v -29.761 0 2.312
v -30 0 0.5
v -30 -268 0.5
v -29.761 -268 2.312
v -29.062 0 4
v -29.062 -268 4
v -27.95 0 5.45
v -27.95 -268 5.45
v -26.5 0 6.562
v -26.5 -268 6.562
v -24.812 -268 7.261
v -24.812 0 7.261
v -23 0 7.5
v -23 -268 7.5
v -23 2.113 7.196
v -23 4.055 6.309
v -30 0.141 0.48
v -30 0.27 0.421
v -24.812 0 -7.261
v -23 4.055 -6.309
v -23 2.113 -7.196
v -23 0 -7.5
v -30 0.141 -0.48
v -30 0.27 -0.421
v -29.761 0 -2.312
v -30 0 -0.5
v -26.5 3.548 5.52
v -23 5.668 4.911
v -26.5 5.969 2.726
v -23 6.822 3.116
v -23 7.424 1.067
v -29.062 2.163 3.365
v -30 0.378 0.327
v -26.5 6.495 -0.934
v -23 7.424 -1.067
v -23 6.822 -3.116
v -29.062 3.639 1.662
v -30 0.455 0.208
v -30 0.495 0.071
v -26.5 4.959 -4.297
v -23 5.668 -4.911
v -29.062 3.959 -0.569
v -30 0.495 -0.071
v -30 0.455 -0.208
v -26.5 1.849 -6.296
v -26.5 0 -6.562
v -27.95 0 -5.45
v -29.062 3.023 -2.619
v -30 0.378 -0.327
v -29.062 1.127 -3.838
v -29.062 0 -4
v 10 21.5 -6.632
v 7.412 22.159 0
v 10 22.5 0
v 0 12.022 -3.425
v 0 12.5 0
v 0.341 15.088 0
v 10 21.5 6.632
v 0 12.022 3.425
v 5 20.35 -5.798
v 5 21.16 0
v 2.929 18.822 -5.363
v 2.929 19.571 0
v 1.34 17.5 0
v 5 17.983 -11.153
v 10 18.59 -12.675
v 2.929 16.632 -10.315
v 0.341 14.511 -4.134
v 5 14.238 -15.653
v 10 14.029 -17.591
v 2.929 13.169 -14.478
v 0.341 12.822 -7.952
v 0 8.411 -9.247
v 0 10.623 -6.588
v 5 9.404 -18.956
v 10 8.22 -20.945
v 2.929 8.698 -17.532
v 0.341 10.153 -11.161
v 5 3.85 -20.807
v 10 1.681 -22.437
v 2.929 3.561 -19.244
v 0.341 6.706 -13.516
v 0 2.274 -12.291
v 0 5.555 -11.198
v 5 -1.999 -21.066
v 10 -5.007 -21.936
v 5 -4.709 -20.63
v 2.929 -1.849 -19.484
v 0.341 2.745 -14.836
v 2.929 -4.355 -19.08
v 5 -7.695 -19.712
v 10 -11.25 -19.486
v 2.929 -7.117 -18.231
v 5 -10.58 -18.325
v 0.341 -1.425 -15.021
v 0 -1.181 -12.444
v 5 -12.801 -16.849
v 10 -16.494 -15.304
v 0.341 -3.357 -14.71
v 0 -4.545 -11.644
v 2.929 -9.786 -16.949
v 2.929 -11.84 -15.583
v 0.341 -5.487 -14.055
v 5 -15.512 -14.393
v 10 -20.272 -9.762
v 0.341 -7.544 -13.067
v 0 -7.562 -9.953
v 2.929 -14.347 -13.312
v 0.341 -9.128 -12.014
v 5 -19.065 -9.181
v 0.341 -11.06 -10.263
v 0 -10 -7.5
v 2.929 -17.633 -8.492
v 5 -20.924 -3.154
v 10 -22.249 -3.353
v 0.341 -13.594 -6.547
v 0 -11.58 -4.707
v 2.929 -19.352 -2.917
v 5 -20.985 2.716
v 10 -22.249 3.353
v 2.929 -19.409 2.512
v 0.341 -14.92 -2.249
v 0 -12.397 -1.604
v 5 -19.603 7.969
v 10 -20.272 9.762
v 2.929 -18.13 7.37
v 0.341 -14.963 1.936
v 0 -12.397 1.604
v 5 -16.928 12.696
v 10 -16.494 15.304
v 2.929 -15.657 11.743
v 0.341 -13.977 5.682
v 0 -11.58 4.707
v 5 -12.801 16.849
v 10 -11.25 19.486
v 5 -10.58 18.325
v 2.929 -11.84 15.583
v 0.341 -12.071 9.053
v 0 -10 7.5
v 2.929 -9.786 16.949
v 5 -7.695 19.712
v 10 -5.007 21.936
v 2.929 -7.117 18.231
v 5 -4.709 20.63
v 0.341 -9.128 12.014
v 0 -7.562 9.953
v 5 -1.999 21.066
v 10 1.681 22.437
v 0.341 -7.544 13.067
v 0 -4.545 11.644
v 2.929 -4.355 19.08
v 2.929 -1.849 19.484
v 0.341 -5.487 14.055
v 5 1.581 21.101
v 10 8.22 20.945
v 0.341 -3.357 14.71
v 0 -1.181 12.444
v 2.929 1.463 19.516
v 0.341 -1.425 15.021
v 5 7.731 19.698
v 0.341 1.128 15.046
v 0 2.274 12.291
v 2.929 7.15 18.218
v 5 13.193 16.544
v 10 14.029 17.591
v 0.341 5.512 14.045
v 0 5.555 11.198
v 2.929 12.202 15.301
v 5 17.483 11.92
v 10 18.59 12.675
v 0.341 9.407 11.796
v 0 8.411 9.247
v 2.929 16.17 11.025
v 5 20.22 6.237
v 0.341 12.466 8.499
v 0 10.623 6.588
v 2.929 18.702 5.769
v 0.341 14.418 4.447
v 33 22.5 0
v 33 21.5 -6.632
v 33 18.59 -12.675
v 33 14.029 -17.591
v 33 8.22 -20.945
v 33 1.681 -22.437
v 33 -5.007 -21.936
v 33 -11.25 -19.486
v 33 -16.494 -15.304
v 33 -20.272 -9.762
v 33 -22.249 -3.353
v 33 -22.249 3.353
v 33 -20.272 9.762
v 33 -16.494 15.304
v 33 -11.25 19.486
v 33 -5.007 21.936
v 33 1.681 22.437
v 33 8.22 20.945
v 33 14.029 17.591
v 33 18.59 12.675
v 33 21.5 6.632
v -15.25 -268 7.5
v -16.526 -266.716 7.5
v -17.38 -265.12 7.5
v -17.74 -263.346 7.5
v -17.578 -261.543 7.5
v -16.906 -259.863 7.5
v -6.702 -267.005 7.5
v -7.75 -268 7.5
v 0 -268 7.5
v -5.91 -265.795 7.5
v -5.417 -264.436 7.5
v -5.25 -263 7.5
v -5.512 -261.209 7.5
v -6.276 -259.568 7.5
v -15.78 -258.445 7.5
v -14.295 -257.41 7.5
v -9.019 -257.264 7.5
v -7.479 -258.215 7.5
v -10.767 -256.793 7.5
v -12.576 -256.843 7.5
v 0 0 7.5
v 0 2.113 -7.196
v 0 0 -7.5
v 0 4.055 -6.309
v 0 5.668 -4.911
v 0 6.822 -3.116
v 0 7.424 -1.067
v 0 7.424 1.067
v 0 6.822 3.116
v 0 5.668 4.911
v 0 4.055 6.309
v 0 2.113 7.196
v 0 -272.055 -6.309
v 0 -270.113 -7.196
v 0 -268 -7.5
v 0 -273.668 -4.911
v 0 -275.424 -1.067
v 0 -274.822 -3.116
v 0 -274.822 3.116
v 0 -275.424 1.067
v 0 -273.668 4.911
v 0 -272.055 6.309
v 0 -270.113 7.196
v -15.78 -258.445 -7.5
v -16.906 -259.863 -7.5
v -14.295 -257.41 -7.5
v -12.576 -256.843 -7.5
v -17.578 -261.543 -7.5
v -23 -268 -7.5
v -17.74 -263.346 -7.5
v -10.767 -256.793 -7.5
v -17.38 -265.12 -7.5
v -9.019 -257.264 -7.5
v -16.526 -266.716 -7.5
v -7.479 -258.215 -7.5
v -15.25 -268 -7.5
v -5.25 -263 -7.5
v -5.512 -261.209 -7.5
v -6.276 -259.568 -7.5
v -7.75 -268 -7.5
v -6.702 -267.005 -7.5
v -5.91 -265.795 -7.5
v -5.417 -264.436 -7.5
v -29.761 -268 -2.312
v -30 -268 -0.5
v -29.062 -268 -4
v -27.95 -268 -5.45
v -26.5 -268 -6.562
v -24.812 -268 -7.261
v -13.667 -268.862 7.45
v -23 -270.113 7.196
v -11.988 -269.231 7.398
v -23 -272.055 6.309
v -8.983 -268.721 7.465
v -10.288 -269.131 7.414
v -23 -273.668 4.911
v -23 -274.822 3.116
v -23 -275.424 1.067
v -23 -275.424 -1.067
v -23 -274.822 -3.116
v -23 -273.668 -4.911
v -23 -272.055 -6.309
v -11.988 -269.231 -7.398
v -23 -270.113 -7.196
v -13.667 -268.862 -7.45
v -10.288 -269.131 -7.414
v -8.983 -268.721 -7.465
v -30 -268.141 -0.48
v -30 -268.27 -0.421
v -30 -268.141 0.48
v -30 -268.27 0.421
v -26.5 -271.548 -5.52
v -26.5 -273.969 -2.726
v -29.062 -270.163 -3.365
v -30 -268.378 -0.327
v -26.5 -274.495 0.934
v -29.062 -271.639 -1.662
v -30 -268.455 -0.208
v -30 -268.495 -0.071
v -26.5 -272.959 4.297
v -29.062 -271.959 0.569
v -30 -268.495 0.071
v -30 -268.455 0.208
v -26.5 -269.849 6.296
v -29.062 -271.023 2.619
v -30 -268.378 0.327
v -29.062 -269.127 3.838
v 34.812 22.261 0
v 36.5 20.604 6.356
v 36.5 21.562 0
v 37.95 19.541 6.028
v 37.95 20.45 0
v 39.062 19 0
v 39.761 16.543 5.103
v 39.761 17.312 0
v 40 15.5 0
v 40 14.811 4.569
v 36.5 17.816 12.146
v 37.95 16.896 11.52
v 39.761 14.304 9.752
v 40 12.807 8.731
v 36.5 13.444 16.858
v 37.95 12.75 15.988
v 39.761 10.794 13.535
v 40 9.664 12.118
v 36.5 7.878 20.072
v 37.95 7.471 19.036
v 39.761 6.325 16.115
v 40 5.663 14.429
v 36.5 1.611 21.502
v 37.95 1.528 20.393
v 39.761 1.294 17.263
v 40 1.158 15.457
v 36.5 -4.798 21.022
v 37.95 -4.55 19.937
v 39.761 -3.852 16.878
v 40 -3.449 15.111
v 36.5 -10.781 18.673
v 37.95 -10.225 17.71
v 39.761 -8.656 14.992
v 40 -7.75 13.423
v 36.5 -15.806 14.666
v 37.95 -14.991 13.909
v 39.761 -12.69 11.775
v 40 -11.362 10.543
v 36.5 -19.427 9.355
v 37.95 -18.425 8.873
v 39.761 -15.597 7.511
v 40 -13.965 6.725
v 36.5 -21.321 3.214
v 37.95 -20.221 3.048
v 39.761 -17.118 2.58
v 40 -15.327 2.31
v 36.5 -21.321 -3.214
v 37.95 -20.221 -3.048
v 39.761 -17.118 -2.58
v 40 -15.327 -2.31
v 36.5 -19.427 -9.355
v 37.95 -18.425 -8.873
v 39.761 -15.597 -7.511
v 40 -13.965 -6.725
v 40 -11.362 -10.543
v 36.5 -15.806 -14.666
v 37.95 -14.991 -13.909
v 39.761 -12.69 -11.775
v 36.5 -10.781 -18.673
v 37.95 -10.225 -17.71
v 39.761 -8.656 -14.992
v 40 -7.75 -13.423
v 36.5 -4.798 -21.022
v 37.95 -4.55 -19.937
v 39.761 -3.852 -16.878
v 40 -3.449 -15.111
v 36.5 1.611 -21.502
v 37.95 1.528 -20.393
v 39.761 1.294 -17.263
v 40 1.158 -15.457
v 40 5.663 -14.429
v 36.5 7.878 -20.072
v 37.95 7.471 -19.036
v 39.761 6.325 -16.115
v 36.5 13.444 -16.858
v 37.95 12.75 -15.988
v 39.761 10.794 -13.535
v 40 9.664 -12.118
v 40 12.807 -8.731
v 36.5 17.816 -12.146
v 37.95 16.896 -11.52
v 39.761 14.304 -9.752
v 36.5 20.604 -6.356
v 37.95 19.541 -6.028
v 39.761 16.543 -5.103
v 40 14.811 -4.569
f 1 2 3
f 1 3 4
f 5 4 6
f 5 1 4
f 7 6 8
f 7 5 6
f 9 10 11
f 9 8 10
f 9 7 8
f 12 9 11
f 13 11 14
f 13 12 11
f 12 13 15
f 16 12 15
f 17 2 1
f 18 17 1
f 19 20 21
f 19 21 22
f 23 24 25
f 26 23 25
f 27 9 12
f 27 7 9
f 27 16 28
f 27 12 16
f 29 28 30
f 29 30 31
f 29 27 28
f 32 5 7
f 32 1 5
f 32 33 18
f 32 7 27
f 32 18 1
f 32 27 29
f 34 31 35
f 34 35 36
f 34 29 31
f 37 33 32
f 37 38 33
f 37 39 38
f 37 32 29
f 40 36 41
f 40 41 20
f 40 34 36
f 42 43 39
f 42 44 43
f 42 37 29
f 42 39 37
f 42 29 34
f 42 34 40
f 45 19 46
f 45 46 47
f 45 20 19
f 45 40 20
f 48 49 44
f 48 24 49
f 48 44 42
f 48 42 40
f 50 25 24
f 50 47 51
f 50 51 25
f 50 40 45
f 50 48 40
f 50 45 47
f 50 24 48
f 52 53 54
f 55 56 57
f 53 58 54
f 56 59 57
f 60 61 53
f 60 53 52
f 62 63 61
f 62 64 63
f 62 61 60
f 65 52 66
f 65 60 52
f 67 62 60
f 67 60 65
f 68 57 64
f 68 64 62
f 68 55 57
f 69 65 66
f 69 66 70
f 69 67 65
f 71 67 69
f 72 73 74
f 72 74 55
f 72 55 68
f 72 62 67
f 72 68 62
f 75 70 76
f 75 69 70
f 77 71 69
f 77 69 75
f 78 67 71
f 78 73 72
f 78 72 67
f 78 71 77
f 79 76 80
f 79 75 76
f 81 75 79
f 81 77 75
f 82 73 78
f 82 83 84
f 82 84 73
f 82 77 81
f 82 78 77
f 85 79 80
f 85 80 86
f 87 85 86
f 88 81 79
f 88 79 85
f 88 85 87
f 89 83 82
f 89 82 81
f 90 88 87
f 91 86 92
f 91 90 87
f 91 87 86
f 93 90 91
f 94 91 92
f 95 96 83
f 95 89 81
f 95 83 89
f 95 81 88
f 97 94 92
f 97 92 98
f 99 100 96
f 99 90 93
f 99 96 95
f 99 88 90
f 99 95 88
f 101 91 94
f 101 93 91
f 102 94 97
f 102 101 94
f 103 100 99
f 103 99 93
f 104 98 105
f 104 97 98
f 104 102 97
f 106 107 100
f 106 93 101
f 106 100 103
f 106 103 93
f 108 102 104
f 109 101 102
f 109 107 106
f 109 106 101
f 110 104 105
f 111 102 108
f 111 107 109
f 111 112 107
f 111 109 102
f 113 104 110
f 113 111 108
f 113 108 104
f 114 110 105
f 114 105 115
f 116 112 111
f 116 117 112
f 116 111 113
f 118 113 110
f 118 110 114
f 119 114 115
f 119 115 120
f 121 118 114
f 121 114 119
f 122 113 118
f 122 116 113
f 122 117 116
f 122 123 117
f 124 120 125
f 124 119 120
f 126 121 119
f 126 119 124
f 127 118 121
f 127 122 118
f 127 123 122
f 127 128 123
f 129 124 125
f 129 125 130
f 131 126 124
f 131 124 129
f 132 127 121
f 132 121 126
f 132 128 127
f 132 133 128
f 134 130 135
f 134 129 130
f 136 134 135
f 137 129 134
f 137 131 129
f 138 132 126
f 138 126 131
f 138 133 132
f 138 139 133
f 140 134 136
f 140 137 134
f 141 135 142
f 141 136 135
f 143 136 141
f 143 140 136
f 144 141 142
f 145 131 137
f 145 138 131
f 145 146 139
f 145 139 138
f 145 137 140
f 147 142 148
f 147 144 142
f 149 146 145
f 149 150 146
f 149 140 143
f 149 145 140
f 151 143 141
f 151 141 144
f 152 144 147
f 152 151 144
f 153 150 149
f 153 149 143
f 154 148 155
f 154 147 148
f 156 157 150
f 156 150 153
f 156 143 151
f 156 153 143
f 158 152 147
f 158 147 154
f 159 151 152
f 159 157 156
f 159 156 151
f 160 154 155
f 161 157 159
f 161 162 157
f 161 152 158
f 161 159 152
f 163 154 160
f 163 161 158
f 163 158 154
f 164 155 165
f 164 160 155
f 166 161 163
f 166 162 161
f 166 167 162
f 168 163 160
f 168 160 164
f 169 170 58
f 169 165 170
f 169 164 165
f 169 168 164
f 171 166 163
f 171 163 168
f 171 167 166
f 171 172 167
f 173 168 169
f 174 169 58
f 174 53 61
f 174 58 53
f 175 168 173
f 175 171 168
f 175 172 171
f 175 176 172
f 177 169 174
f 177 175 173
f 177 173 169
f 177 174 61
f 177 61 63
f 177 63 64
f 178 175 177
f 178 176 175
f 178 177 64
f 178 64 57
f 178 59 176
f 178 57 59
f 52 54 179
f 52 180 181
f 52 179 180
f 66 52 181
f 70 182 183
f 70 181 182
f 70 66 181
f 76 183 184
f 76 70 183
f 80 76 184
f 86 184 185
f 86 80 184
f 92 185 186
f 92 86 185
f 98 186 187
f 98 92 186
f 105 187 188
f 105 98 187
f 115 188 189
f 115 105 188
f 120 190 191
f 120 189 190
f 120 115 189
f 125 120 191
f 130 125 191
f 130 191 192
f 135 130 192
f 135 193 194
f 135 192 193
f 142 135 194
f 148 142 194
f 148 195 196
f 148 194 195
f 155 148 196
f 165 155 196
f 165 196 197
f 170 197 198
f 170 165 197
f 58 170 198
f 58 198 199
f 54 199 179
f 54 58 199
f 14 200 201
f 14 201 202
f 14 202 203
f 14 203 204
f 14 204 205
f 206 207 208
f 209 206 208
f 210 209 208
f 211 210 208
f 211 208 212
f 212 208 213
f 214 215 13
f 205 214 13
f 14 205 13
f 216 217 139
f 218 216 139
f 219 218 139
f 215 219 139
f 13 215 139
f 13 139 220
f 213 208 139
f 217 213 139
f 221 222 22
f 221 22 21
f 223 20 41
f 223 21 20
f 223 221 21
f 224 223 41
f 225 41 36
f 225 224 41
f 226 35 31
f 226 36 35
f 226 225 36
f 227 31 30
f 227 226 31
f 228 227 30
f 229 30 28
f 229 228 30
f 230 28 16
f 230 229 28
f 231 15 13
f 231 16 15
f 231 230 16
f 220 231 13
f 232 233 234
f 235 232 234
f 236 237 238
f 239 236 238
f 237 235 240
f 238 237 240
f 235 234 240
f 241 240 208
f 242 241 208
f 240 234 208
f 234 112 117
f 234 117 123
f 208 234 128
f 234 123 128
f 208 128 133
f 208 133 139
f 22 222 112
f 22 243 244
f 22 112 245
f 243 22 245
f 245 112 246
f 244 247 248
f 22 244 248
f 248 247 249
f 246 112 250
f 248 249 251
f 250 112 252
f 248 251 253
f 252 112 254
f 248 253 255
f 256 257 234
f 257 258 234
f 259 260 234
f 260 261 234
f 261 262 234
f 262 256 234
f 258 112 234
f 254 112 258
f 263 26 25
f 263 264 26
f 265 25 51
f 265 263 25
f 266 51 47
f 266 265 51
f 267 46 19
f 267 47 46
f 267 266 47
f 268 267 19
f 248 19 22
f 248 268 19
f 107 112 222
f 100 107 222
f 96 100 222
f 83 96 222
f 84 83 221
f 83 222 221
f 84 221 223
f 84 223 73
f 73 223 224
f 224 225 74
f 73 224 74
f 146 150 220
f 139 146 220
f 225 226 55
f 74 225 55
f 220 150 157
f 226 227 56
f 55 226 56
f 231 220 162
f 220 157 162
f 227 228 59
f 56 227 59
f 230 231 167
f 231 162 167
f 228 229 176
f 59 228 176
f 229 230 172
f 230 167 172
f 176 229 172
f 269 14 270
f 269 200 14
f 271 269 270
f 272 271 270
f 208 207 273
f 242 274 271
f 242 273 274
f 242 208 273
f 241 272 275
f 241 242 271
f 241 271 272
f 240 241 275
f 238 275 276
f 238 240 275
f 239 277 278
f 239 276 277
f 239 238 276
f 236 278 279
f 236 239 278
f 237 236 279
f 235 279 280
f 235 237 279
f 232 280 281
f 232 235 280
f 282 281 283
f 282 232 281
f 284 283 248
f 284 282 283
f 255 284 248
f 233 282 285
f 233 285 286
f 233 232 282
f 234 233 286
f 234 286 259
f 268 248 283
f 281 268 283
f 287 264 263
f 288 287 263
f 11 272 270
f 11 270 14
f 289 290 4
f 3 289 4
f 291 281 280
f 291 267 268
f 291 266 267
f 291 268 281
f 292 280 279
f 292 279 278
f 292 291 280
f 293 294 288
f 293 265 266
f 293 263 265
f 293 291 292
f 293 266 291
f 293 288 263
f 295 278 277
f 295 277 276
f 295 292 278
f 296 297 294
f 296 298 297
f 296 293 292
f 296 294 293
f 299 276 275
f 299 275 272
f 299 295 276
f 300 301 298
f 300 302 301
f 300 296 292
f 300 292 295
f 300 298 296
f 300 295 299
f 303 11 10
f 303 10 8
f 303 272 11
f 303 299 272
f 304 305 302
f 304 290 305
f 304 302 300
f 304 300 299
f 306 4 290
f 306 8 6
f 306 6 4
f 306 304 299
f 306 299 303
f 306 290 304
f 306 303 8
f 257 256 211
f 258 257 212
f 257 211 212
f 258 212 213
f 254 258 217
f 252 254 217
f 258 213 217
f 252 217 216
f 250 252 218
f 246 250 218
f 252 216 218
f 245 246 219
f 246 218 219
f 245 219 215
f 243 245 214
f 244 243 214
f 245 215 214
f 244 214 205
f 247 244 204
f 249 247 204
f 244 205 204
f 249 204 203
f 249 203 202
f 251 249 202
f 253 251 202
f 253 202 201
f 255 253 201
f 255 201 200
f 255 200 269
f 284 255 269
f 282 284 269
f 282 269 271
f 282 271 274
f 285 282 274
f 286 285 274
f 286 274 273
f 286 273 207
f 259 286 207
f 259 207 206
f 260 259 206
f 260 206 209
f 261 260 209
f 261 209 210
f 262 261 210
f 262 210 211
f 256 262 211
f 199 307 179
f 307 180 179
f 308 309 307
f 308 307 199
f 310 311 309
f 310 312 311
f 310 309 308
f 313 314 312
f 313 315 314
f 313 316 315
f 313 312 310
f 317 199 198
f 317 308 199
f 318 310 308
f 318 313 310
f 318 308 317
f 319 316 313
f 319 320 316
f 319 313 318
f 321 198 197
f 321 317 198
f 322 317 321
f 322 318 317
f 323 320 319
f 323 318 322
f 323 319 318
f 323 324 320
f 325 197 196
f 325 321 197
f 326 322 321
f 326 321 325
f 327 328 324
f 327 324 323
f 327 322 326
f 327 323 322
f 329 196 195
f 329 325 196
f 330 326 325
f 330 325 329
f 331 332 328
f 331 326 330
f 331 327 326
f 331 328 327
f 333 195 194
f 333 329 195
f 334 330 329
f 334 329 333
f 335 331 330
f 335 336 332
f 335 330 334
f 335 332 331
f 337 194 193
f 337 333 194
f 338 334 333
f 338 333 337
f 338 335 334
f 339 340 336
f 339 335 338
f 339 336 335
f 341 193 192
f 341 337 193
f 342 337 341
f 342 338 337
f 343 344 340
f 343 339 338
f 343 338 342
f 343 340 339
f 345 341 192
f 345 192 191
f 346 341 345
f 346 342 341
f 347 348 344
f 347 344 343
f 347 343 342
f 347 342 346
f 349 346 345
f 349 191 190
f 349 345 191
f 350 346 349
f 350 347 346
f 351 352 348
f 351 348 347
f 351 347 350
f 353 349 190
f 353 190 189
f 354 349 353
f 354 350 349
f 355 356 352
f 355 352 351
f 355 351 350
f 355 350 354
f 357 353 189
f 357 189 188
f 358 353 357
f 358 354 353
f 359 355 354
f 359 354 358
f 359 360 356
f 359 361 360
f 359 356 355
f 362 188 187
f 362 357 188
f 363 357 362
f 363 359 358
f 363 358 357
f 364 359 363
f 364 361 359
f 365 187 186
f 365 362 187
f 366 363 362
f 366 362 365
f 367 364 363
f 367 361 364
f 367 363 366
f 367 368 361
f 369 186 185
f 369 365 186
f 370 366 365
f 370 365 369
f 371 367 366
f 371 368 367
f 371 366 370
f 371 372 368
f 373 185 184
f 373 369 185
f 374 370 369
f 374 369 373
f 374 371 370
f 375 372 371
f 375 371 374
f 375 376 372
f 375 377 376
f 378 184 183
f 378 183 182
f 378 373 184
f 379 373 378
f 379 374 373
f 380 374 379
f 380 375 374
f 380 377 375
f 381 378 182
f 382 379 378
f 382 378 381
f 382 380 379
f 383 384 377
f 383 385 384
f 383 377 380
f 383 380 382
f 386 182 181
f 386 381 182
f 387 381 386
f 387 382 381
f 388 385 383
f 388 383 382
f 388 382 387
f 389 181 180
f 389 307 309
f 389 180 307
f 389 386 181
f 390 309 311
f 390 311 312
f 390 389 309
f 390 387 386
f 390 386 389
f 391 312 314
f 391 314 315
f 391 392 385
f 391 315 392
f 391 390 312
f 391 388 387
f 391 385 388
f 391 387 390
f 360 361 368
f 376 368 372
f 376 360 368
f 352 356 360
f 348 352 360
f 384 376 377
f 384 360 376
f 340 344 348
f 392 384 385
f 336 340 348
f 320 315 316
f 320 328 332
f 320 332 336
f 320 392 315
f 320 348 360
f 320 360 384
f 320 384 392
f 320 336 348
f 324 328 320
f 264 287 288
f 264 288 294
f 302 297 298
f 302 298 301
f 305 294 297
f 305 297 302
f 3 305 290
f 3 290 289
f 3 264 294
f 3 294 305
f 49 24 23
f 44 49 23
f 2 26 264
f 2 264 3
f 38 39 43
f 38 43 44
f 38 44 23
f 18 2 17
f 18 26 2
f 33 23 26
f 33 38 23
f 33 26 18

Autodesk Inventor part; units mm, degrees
ref_plane "YZ Plane" through (0, 0, 0) normal (1, 0, 0) x (0, 1, 0)
ref_plane "XZ Plane" through (0, 0, 0) normal (0, 1, 0) x (-1, 0, 0)
ref_plane "XY Plane" through (0, 0, 0) normal (0, 0, 1) x (1, 0, 0)
sketch "Esboço1" plane through (0, 0, 0) normal (1, 0, 0) x (0, 1, 0)
  circle A0 centre (0, 0) radius 22.5
  dimension "d0" = 45
extrude "Extrusão1" add sketch "Esboço1" along normal blind 40
fillet "Arredondamento1" radius 10 1 edges at (0, -22.5, 0)
sketch "Esboço2" plane through (0, 0, 0) normal (-1, 0, 0) x (0, 0, 1)
  line L0 (0, 0) -> (0, -268) construction
  line L1 (-7.5, 0) -> (-7.5, -268)
  line L2 (7.5, -268) -> (7.5, 0)
  arc A0 (7.5, 0) -> (-7.5, 0) centre (0, 0) ccw
  arc A1 (-7.5, -268) -> (7.5, -268) centre (0, -268) ccw
  point P0 (0, -134)
  dimension "d5" = 15
extrude "Extrusão2" add sketch "Esboço2" along normal blind 30
fillet "Arredondamento2" radius 7 5 edges at (-30, -134, 7.5) (-30, 7.5, 0) (-30, -134, -7.5) (-30, -275.5, 0) (40, -22.5, 0)
sketch "Esboço3" plane through (0, -268, 7.5) normal (0, 0, 1) x (1, 0, 0)
  circle A0 centre (-11.5, 5) radius 6.25
  point P0 (0, 268)
extrude "Extrusão3" cut sketch "Esboço3" against normal blind 30
properties part number "braço"
